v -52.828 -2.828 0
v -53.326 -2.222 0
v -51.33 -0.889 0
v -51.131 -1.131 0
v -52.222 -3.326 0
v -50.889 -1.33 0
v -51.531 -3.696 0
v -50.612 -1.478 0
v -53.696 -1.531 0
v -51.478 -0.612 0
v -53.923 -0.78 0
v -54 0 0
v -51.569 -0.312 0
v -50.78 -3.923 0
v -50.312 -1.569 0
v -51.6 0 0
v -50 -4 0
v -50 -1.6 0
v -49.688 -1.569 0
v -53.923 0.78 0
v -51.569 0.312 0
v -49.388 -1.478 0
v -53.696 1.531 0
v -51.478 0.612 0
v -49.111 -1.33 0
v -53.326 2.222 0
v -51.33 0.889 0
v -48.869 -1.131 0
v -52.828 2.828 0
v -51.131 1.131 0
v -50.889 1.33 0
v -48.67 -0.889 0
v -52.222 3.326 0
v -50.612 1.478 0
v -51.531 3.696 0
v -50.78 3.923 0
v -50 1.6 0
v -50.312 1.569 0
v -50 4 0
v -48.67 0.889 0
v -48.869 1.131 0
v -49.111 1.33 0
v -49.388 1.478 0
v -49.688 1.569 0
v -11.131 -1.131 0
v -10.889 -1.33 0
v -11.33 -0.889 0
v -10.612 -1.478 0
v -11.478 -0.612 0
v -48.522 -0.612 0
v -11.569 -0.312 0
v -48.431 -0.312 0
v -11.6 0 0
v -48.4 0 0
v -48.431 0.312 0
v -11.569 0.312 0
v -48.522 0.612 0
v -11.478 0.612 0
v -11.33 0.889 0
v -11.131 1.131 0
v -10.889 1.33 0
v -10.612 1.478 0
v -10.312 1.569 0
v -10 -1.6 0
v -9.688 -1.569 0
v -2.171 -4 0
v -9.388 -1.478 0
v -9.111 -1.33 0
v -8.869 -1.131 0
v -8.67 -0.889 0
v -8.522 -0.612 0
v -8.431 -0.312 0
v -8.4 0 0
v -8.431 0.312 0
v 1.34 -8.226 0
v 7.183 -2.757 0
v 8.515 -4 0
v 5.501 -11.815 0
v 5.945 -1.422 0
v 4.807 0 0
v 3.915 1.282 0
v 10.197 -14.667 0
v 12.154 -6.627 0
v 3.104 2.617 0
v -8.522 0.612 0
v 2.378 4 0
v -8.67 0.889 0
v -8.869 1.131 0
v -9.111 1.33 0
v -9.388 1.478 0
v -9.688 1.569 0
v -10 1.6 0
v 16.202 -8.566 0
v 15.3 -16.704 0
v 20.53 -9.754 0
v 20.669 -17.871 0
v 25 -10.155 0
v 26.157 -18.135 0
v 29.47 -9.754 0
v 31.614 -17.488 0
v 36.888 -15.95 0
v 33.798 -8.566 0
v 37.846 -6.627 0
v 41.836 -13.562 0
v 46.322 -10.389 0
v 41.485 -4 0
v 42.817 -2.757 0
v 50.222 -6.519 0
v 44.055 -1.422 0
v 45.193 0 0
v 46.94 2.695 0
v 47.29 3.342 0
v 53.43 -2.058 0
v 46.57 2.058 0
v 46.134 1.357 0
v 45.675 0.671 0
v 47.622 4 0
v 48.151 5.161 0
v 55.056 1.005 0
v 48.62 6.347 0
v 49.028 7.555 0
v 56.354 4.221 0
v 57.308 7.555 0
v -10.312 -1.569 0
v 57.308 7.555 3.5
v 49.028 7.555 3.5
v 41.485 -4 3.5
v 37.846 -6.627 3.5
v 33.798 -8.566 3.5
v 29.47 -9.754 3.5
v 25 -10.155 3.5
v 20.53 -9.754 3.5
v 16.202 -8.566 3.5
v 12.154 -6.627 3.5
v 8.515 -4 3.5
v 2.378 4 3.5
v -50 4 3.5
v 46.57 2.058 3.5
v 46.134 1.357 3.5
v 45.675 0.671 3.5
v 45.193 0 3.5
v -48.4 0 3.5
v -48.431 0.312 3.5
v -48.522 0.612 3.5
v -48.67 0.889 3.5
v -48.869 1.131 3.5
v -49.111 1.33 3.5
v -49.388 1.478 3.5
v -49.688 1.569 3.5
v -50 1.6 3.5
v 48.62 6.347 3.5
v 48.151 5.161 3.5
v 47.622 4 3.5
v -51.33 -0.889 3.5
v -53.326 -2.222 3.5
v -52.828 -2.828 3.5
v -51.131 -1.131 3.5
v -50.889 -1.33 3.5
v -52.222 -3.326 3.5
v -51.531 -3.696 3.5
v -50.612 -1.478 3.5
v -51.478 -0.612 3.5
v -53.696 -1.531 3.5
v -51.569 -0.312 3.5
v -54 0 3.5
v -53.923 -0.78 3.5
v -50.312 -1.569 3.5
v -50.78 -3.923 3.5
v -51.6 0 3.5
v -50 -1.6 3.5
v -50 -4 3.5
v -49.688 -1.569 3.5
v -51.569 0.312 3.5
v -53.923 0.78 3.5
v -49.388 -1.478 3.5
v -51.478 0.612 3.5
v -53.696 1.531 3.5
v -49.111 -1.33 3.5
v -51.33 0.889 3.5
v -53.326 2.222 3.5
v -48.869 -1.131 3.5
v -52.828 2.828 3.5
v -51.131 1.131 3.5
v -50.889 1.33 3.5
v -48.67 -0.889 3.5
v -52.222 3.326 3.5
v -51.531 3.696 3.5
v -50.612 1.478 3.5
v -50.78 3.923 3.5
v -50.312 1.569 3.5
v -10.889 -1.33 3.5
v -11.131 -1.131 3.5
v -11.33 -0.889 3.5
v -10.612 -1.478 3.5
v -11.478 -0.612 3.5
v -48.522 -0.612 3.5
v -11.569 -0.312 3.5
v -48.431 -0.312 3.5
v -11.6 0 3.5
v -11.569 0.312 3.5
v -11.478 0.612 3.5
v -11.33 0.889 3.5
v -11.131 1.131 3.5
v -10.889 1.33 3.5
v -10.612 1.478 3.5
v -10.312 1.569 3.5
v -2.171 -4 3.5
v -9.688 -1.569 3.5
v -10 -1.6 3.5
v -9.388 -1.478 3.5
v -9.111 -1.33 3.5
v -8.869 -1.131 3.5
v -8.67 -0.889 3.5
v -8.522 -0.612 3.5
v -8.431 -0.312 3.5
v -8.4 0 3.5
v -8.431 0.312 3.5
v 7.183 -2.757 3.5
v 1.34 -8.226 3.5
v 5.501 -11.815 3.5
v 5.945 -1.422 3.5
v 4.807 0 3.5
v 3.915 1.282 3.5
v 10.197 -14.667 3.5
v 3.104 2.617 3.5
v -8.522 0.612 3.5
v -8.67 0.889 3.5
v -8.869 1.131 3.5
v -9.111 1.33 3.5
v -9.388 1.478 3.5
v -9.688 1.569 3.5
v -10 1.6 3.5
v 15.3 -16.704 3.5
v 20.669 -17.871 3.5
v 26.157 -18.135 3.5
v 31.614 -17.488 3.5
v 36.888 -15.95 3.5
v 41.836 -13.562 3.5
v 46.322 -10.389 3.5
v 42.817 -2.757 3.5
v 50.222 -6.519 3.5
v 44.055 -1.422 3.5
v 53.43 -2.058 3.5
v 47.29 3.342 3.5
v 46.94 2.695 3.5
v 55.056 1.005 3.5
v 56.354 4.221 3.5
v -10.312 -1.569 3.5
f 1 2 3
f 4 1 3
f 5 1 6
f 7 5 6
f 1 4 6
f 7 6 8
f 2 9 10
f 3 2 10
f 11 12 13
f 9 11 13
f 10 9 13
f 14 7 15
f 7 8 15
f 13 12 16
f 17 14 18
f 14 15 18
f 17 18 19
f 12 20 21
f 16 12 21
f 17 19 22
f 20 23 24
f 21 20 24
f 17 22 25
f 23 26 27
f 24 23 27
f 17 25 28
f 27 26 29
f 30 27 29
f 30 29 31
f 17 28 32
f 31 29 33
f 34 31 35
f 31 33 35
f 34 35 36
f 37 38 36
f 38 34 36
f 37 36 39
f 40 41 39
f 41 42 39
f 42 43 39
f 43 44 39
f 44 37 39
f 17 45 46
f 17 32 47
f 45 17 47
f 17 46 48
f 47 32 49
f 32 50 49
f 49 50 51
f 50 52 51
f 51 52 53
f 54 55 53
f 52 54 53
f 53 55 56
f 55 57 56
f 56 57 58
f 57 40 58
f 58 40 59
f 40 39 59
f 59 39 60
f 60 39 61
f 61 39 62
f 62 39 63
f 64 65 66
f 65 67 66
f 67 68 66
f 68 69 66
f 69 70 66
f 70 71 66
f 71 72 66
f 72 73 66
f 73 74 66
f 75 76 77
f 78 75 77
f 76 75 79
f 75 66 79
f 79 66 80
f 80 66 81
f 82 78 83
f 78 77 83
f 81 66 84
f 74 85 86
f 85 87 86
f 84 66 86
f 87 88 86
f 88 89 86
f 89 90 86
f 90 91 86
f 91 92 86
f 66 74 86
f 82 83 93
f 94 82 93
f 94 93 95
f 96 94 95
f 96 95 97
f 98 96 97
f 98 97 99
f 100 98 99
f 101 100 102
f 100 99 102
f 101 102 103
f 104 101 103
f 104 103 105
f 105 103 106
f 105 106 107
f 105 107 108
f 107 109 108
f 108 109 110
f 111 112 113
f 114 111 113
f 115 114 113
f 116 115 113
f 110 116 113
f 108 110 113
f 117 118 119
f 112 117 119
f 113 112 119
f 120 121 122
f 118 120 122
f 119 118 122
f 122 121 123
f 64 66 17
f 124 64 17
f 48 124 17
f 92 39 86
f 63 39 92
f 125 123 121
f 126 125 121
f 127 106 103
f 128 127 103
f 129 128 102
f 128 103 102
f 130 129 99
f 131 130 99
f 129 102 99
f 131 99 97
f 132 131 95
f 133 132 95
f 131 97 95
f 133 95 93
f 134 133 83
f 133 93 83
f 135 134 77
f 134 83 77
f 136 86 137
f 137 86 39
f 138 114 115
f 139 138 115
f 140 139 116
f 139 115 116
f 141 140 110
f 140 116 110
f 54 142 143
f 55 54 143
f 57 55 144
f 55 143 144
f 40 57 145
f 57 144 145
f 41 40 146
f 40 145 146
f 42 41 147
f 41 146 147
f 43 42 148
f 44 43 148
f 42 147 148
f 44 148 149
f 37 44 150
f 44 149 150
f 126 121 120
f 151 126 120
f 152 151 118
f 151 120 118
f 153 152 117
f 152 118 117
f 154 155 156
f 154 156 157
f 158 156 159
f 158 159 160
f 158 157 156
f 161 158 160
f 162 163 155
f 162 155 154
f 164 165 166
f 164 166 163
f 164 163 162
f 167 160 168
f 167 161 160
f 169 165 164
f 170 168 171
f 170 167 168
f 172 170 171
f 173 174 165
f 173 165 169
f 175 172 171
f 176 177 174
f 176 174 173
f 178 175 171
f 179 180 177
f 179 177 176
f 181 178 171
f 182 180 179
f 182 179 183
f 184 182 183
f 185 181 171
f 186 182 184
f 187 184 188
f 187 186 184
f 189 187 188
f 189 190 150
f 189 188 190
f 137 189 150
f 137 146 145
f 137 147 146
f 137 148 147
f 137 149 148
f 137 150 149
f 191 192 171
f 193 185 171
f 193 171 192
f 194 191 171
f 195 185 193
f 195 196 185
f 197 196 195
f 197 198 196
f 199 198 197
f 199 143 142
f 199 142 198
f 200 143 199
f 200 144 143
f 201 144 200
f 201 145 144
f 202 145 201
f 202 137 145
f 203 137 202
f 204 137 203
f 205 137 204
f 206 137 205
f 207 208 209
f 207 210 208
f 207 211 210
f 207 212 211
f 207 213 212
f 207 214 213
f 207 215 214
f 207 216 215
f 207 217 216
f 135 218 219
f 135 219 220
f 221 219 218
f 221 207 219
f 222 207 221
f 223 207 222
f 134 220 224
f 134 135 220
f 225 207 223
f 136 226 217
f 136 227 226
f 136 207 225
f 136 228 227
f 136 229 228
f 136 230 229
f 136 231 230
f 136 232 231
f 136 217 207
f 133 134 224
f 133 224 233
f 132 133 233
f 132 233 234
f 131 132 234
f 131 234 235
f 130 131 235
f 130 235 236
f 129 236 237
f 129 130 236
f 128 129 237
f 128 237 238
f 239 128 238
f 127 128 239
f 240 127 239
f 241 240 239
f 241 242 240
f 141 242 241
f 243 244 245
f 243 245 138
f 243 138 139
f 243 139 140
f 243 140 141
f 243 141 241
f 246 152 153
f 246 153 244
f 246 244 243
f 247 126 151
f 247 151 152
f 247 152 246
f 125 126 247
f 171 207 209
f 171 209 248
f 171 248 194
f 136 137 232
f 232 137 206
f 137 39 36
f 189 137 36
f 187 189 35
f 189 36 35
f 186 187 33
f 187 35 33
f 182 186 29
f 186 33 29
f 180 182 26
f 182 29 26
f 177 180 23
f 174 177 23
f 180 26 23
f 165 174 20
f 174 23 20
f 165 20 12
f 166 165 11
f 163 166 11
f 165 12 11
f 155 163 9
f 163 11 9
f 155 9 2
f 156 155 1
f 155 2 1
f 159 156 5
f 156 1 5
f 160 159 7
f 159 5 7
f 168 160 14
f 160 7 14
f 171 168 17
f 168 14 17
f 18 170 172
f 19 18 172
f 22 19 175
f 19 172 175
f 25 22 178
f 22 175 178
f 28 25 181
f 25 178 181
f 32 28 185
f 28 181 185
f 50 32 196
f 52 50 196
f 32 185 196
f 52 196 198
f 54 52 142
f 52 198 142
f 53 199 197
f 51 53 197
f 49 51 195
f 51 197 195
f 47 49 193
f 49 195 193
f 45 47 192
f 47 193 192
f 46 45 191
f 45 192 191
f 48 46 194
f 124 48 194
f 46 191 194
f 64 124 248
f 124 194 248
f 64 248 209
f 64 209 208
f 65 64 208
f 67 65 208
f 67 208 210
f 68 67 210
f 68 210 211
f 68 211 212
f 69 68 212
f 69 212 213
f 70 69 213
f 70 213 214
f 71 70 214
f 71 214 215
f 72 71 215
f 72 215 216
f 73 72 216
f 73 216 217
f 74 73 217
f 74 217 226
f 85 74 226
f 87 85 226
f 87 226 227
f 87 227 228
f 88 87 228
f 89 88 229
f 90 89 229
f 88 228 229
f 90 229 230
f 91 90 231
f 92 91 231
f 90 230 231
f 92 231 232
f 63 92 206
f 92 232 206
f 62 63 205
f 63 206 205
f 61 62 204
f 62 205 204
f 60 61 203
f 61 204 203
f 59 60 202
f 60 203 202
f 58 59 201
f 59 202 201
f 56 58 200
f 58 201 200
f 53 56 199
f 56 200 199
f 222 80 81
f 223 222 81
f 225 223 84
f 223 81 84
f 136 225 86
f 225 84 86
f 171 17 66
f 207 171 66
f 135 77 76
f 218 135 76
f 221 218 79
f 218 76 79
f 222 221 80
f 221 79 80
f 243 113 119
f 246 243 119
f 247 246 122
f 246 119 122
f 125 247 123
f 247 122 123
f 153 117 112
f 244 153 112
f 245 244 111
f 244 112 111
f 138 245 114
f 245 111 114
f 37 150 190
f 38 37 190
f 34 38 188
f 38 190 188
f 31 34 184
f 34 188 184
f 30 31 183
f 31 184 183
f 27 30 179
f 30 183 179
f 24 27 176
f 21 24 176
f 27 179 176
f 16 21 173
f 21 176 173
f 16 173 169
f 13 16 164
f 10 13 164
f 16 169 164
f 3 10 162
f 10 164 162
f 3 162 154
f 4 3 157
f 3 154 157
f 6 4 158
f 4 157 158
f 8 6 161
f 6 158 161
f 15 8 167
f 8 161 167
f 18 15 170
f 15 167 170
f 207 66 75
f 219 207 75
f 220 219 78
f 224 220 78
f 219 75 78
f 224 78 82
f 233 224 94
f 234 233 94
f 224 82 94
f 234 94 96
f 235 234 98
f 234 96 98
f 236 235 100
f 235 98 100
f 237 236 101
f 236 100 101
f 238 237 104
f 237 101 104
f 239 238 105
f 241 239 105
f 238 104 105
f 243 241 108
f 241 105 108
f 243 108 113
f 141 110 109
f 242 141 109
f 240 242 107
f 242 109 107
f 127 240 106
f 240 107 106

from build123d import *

# Parameters (mm, degrees)
F1_DEPTH = 3.5
F3_DEPTH = 3.501


# Not quite as in the source:
# - a feature names something its author has since deleted; it is built from what else it names


with BuildPart() as f1:
    # F0 (on Top) → F1 (new body)
    with BuildSketch(Plane.XY):
        with BuildLine():
            ThreePointArc((-50, 4), (-54, 0), (-50, -4))
            Line((-50, -4), (-50, 4))
        make_face()
        with BuildLine():
            Line((-50, 4), (-50, -4))
            ThreePointArc((-50, -4), (-47.1715728753, -2.8284271247), (-46, 0))
            ThreePointArc((-46, 0), (-47.1715728753, 2.8284271247), (-50, 4))
        make_face()
        with BuildLine():
            Line((-50, -4), (-2.1705369066, -4))
            ThreePointArc((-2.1705369066, -4), (-4.496147737, -0.1398594601), (-6.2767977228, 4))
            Line((-6.2767977228, 4), (-50, 4))
            ThreePointArc((-50, 4), (-47.1715728753, 2.8284271247), (-46, 0))
            ThreePointArc((-46, 0), (-47.1715728753, -2.8284271247), (-50, -4))
        make_face()
        with BuildLine():
            Line((-2.1705369066, -4), (8.5147968103, -4))
            ThreePointArc((8.5147968103, -4), (6.5521066164, -2.1007939556), (4.8068842373, 0))
            ThreePointArc((4.8068842373, 0), (3.4991426783, 1.9433902318), (2.3778443952, 4))
            Line((2.3778443952, 4), (-6.2767977228, 4))
            ThreePointArc((-6.2767977228, 4), (-4.496147737, -0.1398594601), (-2.1705369066, -4))
        make_face()
        with BuildLine():
            ThreePointArc((53.4299716908, -2.0579830418), (51.9707952498, -3.4807996328), (50, -4))
            Line((50, -4), (41.4852031897, -4))
            ThreePointArc((41.4852031897, -4), (25, -10.1547594742), (8.5147968103, -4))
            Line((8.5147968103, -4), (-2.1705369066, -4))
            ThreePointArc((-2.1705369066, -4), (26.1573251317, -18.1345540838), (53.4299716908, -2.0579830418))
        make_face()
        with BuildLine():
            Line((41.4852031897, -4), (50, -4))
            ThreePointArc((50, -4), (47.1715728753, -2.8284271247), (46, 0))
            Line((46, 0), (45.1931157627, 0))
            ThreePointArc((45.1931157627, 0), (43.4478933836, -2.1007939556), (41.4852031897, -4))
        make_face()
        with BuildLine():
            ThreePointArc((46, 0), (47.1715728753, -2.8284271247), (50, -4))
            Line((50, -4), (50, 0))
            Line((50, 0), (46, 0))
        make_face()
        with BuildLine():
            Line((50, 0), (50, -4))
            ThreePointArc((50, -4), (51.9707952498, -3.4807996328), (53.4299716908, -2.0579830418))
            ThreePointArc((53.4299716908, -2.0579830418), (53.8548597097, -1.0677343389), (54, 0))
            ThreePointArc((54, 0), (52.8284271247, 2.8284271247), (50, 4))
            Line((50, 4), (50, 0))
        make_face()
        with BuildLine():
            Line((46, 0), (50, 0))
            Line((50, 0), (50, 4))
            ThreePointArc((50, 4), (48.0292047387, 3.4807996262), (46.5700282955, 2.0579830189))
            ThreePointArc((46.5700282955, 2.0579830189), (46.1451402867, 1.067734326), (46, 0))
        make_face()
        with BuildLine():
            ThreePointArc((46.5700282955, 2.0579830189), (48.0292047387, 3.4807996262), (50, 4))
            Line((50, 4), (47.6221556048, 4))
            ThreePointArc((47.6221556048, 4), (47.1174170499, 3.0174382017), (46.5700282955, 2.0579830189))
        make_face()
        with BuildLine():
            Line((45.1931157627, 0), (46, 0))
            ThreePointArc((46, 0), (46.1451402867, 1.067734326), (46.5700282955, 2.0579830189))
            ThreePointArc((46.5700282955, 2.0579830189), (45.9069097174, 1.0120390952), (45.1931157627, 0))
        make_face()
        with BuildLine():
            ThreePointArc((54, 0), (53.8548597097, -1.0677343389), (53.4299716908, -2.0579830418))
            ThreePointArc((53.4299716908, -2.0579830418), (55.7469814085, 2.5959196207), (57.3080045365, 7.5548056666))
            Line((57.3080045365, 7.5548056666), (49.0277132816, 7.5548056666))
            ThreePointArc((49.0277132816, 7.5548056666), (48.3925570986, 5.7506650728), (47.6221556048, 4))
            Line((47.6221556048, 4), (50, 4))
            ThreePointArc((50, 4), (52.8284271247, 2.8284271247), (54, 0))
        make_face()
    extrude(amount=F1_DEPTH)

    # F2 (on face) → F3 (cut, through all)
    with BuildSketch(Plane.XY.offset(3.5)):
        with BuildLine():
            ThreePointArc((-48.4, 0), (-48.8686291501, 1.1313708499), (-50, 1.6))
            Line((-50, 1.6), (-50, 0))
            Line((-50, 0), (-48.4, 0))
        make_face()
        with BuildLine():
            Line((-50, 0), (-50, 1.6))
            ThreePointArc((-50, 1.6), (-51.6, 0), (-50, -1.6))
            Line((-50, -1.6), (-50, 0))
        make_face()
        with BuildLine():
            ThreePointArc((-8.4, 0), (-10, 1.6), (-11.6, 0))
            ThreePointArc((-11.6, 0), (-10, -1.6), (-8.4, 0))
        make_face()
        with BuildLine():
            Line((-48.4, 0), (-50, 0))
            Line((-50, 0), (-50, -1.6))
            ThreePointArc((-50, -1.6), (-48.8686291501, -1.1313708499), (-48.4, 0))
        make_face()
    extrude(amount=-F3_DEPTH, mode=Mode.SUBTRACT)


solid = f1.part
